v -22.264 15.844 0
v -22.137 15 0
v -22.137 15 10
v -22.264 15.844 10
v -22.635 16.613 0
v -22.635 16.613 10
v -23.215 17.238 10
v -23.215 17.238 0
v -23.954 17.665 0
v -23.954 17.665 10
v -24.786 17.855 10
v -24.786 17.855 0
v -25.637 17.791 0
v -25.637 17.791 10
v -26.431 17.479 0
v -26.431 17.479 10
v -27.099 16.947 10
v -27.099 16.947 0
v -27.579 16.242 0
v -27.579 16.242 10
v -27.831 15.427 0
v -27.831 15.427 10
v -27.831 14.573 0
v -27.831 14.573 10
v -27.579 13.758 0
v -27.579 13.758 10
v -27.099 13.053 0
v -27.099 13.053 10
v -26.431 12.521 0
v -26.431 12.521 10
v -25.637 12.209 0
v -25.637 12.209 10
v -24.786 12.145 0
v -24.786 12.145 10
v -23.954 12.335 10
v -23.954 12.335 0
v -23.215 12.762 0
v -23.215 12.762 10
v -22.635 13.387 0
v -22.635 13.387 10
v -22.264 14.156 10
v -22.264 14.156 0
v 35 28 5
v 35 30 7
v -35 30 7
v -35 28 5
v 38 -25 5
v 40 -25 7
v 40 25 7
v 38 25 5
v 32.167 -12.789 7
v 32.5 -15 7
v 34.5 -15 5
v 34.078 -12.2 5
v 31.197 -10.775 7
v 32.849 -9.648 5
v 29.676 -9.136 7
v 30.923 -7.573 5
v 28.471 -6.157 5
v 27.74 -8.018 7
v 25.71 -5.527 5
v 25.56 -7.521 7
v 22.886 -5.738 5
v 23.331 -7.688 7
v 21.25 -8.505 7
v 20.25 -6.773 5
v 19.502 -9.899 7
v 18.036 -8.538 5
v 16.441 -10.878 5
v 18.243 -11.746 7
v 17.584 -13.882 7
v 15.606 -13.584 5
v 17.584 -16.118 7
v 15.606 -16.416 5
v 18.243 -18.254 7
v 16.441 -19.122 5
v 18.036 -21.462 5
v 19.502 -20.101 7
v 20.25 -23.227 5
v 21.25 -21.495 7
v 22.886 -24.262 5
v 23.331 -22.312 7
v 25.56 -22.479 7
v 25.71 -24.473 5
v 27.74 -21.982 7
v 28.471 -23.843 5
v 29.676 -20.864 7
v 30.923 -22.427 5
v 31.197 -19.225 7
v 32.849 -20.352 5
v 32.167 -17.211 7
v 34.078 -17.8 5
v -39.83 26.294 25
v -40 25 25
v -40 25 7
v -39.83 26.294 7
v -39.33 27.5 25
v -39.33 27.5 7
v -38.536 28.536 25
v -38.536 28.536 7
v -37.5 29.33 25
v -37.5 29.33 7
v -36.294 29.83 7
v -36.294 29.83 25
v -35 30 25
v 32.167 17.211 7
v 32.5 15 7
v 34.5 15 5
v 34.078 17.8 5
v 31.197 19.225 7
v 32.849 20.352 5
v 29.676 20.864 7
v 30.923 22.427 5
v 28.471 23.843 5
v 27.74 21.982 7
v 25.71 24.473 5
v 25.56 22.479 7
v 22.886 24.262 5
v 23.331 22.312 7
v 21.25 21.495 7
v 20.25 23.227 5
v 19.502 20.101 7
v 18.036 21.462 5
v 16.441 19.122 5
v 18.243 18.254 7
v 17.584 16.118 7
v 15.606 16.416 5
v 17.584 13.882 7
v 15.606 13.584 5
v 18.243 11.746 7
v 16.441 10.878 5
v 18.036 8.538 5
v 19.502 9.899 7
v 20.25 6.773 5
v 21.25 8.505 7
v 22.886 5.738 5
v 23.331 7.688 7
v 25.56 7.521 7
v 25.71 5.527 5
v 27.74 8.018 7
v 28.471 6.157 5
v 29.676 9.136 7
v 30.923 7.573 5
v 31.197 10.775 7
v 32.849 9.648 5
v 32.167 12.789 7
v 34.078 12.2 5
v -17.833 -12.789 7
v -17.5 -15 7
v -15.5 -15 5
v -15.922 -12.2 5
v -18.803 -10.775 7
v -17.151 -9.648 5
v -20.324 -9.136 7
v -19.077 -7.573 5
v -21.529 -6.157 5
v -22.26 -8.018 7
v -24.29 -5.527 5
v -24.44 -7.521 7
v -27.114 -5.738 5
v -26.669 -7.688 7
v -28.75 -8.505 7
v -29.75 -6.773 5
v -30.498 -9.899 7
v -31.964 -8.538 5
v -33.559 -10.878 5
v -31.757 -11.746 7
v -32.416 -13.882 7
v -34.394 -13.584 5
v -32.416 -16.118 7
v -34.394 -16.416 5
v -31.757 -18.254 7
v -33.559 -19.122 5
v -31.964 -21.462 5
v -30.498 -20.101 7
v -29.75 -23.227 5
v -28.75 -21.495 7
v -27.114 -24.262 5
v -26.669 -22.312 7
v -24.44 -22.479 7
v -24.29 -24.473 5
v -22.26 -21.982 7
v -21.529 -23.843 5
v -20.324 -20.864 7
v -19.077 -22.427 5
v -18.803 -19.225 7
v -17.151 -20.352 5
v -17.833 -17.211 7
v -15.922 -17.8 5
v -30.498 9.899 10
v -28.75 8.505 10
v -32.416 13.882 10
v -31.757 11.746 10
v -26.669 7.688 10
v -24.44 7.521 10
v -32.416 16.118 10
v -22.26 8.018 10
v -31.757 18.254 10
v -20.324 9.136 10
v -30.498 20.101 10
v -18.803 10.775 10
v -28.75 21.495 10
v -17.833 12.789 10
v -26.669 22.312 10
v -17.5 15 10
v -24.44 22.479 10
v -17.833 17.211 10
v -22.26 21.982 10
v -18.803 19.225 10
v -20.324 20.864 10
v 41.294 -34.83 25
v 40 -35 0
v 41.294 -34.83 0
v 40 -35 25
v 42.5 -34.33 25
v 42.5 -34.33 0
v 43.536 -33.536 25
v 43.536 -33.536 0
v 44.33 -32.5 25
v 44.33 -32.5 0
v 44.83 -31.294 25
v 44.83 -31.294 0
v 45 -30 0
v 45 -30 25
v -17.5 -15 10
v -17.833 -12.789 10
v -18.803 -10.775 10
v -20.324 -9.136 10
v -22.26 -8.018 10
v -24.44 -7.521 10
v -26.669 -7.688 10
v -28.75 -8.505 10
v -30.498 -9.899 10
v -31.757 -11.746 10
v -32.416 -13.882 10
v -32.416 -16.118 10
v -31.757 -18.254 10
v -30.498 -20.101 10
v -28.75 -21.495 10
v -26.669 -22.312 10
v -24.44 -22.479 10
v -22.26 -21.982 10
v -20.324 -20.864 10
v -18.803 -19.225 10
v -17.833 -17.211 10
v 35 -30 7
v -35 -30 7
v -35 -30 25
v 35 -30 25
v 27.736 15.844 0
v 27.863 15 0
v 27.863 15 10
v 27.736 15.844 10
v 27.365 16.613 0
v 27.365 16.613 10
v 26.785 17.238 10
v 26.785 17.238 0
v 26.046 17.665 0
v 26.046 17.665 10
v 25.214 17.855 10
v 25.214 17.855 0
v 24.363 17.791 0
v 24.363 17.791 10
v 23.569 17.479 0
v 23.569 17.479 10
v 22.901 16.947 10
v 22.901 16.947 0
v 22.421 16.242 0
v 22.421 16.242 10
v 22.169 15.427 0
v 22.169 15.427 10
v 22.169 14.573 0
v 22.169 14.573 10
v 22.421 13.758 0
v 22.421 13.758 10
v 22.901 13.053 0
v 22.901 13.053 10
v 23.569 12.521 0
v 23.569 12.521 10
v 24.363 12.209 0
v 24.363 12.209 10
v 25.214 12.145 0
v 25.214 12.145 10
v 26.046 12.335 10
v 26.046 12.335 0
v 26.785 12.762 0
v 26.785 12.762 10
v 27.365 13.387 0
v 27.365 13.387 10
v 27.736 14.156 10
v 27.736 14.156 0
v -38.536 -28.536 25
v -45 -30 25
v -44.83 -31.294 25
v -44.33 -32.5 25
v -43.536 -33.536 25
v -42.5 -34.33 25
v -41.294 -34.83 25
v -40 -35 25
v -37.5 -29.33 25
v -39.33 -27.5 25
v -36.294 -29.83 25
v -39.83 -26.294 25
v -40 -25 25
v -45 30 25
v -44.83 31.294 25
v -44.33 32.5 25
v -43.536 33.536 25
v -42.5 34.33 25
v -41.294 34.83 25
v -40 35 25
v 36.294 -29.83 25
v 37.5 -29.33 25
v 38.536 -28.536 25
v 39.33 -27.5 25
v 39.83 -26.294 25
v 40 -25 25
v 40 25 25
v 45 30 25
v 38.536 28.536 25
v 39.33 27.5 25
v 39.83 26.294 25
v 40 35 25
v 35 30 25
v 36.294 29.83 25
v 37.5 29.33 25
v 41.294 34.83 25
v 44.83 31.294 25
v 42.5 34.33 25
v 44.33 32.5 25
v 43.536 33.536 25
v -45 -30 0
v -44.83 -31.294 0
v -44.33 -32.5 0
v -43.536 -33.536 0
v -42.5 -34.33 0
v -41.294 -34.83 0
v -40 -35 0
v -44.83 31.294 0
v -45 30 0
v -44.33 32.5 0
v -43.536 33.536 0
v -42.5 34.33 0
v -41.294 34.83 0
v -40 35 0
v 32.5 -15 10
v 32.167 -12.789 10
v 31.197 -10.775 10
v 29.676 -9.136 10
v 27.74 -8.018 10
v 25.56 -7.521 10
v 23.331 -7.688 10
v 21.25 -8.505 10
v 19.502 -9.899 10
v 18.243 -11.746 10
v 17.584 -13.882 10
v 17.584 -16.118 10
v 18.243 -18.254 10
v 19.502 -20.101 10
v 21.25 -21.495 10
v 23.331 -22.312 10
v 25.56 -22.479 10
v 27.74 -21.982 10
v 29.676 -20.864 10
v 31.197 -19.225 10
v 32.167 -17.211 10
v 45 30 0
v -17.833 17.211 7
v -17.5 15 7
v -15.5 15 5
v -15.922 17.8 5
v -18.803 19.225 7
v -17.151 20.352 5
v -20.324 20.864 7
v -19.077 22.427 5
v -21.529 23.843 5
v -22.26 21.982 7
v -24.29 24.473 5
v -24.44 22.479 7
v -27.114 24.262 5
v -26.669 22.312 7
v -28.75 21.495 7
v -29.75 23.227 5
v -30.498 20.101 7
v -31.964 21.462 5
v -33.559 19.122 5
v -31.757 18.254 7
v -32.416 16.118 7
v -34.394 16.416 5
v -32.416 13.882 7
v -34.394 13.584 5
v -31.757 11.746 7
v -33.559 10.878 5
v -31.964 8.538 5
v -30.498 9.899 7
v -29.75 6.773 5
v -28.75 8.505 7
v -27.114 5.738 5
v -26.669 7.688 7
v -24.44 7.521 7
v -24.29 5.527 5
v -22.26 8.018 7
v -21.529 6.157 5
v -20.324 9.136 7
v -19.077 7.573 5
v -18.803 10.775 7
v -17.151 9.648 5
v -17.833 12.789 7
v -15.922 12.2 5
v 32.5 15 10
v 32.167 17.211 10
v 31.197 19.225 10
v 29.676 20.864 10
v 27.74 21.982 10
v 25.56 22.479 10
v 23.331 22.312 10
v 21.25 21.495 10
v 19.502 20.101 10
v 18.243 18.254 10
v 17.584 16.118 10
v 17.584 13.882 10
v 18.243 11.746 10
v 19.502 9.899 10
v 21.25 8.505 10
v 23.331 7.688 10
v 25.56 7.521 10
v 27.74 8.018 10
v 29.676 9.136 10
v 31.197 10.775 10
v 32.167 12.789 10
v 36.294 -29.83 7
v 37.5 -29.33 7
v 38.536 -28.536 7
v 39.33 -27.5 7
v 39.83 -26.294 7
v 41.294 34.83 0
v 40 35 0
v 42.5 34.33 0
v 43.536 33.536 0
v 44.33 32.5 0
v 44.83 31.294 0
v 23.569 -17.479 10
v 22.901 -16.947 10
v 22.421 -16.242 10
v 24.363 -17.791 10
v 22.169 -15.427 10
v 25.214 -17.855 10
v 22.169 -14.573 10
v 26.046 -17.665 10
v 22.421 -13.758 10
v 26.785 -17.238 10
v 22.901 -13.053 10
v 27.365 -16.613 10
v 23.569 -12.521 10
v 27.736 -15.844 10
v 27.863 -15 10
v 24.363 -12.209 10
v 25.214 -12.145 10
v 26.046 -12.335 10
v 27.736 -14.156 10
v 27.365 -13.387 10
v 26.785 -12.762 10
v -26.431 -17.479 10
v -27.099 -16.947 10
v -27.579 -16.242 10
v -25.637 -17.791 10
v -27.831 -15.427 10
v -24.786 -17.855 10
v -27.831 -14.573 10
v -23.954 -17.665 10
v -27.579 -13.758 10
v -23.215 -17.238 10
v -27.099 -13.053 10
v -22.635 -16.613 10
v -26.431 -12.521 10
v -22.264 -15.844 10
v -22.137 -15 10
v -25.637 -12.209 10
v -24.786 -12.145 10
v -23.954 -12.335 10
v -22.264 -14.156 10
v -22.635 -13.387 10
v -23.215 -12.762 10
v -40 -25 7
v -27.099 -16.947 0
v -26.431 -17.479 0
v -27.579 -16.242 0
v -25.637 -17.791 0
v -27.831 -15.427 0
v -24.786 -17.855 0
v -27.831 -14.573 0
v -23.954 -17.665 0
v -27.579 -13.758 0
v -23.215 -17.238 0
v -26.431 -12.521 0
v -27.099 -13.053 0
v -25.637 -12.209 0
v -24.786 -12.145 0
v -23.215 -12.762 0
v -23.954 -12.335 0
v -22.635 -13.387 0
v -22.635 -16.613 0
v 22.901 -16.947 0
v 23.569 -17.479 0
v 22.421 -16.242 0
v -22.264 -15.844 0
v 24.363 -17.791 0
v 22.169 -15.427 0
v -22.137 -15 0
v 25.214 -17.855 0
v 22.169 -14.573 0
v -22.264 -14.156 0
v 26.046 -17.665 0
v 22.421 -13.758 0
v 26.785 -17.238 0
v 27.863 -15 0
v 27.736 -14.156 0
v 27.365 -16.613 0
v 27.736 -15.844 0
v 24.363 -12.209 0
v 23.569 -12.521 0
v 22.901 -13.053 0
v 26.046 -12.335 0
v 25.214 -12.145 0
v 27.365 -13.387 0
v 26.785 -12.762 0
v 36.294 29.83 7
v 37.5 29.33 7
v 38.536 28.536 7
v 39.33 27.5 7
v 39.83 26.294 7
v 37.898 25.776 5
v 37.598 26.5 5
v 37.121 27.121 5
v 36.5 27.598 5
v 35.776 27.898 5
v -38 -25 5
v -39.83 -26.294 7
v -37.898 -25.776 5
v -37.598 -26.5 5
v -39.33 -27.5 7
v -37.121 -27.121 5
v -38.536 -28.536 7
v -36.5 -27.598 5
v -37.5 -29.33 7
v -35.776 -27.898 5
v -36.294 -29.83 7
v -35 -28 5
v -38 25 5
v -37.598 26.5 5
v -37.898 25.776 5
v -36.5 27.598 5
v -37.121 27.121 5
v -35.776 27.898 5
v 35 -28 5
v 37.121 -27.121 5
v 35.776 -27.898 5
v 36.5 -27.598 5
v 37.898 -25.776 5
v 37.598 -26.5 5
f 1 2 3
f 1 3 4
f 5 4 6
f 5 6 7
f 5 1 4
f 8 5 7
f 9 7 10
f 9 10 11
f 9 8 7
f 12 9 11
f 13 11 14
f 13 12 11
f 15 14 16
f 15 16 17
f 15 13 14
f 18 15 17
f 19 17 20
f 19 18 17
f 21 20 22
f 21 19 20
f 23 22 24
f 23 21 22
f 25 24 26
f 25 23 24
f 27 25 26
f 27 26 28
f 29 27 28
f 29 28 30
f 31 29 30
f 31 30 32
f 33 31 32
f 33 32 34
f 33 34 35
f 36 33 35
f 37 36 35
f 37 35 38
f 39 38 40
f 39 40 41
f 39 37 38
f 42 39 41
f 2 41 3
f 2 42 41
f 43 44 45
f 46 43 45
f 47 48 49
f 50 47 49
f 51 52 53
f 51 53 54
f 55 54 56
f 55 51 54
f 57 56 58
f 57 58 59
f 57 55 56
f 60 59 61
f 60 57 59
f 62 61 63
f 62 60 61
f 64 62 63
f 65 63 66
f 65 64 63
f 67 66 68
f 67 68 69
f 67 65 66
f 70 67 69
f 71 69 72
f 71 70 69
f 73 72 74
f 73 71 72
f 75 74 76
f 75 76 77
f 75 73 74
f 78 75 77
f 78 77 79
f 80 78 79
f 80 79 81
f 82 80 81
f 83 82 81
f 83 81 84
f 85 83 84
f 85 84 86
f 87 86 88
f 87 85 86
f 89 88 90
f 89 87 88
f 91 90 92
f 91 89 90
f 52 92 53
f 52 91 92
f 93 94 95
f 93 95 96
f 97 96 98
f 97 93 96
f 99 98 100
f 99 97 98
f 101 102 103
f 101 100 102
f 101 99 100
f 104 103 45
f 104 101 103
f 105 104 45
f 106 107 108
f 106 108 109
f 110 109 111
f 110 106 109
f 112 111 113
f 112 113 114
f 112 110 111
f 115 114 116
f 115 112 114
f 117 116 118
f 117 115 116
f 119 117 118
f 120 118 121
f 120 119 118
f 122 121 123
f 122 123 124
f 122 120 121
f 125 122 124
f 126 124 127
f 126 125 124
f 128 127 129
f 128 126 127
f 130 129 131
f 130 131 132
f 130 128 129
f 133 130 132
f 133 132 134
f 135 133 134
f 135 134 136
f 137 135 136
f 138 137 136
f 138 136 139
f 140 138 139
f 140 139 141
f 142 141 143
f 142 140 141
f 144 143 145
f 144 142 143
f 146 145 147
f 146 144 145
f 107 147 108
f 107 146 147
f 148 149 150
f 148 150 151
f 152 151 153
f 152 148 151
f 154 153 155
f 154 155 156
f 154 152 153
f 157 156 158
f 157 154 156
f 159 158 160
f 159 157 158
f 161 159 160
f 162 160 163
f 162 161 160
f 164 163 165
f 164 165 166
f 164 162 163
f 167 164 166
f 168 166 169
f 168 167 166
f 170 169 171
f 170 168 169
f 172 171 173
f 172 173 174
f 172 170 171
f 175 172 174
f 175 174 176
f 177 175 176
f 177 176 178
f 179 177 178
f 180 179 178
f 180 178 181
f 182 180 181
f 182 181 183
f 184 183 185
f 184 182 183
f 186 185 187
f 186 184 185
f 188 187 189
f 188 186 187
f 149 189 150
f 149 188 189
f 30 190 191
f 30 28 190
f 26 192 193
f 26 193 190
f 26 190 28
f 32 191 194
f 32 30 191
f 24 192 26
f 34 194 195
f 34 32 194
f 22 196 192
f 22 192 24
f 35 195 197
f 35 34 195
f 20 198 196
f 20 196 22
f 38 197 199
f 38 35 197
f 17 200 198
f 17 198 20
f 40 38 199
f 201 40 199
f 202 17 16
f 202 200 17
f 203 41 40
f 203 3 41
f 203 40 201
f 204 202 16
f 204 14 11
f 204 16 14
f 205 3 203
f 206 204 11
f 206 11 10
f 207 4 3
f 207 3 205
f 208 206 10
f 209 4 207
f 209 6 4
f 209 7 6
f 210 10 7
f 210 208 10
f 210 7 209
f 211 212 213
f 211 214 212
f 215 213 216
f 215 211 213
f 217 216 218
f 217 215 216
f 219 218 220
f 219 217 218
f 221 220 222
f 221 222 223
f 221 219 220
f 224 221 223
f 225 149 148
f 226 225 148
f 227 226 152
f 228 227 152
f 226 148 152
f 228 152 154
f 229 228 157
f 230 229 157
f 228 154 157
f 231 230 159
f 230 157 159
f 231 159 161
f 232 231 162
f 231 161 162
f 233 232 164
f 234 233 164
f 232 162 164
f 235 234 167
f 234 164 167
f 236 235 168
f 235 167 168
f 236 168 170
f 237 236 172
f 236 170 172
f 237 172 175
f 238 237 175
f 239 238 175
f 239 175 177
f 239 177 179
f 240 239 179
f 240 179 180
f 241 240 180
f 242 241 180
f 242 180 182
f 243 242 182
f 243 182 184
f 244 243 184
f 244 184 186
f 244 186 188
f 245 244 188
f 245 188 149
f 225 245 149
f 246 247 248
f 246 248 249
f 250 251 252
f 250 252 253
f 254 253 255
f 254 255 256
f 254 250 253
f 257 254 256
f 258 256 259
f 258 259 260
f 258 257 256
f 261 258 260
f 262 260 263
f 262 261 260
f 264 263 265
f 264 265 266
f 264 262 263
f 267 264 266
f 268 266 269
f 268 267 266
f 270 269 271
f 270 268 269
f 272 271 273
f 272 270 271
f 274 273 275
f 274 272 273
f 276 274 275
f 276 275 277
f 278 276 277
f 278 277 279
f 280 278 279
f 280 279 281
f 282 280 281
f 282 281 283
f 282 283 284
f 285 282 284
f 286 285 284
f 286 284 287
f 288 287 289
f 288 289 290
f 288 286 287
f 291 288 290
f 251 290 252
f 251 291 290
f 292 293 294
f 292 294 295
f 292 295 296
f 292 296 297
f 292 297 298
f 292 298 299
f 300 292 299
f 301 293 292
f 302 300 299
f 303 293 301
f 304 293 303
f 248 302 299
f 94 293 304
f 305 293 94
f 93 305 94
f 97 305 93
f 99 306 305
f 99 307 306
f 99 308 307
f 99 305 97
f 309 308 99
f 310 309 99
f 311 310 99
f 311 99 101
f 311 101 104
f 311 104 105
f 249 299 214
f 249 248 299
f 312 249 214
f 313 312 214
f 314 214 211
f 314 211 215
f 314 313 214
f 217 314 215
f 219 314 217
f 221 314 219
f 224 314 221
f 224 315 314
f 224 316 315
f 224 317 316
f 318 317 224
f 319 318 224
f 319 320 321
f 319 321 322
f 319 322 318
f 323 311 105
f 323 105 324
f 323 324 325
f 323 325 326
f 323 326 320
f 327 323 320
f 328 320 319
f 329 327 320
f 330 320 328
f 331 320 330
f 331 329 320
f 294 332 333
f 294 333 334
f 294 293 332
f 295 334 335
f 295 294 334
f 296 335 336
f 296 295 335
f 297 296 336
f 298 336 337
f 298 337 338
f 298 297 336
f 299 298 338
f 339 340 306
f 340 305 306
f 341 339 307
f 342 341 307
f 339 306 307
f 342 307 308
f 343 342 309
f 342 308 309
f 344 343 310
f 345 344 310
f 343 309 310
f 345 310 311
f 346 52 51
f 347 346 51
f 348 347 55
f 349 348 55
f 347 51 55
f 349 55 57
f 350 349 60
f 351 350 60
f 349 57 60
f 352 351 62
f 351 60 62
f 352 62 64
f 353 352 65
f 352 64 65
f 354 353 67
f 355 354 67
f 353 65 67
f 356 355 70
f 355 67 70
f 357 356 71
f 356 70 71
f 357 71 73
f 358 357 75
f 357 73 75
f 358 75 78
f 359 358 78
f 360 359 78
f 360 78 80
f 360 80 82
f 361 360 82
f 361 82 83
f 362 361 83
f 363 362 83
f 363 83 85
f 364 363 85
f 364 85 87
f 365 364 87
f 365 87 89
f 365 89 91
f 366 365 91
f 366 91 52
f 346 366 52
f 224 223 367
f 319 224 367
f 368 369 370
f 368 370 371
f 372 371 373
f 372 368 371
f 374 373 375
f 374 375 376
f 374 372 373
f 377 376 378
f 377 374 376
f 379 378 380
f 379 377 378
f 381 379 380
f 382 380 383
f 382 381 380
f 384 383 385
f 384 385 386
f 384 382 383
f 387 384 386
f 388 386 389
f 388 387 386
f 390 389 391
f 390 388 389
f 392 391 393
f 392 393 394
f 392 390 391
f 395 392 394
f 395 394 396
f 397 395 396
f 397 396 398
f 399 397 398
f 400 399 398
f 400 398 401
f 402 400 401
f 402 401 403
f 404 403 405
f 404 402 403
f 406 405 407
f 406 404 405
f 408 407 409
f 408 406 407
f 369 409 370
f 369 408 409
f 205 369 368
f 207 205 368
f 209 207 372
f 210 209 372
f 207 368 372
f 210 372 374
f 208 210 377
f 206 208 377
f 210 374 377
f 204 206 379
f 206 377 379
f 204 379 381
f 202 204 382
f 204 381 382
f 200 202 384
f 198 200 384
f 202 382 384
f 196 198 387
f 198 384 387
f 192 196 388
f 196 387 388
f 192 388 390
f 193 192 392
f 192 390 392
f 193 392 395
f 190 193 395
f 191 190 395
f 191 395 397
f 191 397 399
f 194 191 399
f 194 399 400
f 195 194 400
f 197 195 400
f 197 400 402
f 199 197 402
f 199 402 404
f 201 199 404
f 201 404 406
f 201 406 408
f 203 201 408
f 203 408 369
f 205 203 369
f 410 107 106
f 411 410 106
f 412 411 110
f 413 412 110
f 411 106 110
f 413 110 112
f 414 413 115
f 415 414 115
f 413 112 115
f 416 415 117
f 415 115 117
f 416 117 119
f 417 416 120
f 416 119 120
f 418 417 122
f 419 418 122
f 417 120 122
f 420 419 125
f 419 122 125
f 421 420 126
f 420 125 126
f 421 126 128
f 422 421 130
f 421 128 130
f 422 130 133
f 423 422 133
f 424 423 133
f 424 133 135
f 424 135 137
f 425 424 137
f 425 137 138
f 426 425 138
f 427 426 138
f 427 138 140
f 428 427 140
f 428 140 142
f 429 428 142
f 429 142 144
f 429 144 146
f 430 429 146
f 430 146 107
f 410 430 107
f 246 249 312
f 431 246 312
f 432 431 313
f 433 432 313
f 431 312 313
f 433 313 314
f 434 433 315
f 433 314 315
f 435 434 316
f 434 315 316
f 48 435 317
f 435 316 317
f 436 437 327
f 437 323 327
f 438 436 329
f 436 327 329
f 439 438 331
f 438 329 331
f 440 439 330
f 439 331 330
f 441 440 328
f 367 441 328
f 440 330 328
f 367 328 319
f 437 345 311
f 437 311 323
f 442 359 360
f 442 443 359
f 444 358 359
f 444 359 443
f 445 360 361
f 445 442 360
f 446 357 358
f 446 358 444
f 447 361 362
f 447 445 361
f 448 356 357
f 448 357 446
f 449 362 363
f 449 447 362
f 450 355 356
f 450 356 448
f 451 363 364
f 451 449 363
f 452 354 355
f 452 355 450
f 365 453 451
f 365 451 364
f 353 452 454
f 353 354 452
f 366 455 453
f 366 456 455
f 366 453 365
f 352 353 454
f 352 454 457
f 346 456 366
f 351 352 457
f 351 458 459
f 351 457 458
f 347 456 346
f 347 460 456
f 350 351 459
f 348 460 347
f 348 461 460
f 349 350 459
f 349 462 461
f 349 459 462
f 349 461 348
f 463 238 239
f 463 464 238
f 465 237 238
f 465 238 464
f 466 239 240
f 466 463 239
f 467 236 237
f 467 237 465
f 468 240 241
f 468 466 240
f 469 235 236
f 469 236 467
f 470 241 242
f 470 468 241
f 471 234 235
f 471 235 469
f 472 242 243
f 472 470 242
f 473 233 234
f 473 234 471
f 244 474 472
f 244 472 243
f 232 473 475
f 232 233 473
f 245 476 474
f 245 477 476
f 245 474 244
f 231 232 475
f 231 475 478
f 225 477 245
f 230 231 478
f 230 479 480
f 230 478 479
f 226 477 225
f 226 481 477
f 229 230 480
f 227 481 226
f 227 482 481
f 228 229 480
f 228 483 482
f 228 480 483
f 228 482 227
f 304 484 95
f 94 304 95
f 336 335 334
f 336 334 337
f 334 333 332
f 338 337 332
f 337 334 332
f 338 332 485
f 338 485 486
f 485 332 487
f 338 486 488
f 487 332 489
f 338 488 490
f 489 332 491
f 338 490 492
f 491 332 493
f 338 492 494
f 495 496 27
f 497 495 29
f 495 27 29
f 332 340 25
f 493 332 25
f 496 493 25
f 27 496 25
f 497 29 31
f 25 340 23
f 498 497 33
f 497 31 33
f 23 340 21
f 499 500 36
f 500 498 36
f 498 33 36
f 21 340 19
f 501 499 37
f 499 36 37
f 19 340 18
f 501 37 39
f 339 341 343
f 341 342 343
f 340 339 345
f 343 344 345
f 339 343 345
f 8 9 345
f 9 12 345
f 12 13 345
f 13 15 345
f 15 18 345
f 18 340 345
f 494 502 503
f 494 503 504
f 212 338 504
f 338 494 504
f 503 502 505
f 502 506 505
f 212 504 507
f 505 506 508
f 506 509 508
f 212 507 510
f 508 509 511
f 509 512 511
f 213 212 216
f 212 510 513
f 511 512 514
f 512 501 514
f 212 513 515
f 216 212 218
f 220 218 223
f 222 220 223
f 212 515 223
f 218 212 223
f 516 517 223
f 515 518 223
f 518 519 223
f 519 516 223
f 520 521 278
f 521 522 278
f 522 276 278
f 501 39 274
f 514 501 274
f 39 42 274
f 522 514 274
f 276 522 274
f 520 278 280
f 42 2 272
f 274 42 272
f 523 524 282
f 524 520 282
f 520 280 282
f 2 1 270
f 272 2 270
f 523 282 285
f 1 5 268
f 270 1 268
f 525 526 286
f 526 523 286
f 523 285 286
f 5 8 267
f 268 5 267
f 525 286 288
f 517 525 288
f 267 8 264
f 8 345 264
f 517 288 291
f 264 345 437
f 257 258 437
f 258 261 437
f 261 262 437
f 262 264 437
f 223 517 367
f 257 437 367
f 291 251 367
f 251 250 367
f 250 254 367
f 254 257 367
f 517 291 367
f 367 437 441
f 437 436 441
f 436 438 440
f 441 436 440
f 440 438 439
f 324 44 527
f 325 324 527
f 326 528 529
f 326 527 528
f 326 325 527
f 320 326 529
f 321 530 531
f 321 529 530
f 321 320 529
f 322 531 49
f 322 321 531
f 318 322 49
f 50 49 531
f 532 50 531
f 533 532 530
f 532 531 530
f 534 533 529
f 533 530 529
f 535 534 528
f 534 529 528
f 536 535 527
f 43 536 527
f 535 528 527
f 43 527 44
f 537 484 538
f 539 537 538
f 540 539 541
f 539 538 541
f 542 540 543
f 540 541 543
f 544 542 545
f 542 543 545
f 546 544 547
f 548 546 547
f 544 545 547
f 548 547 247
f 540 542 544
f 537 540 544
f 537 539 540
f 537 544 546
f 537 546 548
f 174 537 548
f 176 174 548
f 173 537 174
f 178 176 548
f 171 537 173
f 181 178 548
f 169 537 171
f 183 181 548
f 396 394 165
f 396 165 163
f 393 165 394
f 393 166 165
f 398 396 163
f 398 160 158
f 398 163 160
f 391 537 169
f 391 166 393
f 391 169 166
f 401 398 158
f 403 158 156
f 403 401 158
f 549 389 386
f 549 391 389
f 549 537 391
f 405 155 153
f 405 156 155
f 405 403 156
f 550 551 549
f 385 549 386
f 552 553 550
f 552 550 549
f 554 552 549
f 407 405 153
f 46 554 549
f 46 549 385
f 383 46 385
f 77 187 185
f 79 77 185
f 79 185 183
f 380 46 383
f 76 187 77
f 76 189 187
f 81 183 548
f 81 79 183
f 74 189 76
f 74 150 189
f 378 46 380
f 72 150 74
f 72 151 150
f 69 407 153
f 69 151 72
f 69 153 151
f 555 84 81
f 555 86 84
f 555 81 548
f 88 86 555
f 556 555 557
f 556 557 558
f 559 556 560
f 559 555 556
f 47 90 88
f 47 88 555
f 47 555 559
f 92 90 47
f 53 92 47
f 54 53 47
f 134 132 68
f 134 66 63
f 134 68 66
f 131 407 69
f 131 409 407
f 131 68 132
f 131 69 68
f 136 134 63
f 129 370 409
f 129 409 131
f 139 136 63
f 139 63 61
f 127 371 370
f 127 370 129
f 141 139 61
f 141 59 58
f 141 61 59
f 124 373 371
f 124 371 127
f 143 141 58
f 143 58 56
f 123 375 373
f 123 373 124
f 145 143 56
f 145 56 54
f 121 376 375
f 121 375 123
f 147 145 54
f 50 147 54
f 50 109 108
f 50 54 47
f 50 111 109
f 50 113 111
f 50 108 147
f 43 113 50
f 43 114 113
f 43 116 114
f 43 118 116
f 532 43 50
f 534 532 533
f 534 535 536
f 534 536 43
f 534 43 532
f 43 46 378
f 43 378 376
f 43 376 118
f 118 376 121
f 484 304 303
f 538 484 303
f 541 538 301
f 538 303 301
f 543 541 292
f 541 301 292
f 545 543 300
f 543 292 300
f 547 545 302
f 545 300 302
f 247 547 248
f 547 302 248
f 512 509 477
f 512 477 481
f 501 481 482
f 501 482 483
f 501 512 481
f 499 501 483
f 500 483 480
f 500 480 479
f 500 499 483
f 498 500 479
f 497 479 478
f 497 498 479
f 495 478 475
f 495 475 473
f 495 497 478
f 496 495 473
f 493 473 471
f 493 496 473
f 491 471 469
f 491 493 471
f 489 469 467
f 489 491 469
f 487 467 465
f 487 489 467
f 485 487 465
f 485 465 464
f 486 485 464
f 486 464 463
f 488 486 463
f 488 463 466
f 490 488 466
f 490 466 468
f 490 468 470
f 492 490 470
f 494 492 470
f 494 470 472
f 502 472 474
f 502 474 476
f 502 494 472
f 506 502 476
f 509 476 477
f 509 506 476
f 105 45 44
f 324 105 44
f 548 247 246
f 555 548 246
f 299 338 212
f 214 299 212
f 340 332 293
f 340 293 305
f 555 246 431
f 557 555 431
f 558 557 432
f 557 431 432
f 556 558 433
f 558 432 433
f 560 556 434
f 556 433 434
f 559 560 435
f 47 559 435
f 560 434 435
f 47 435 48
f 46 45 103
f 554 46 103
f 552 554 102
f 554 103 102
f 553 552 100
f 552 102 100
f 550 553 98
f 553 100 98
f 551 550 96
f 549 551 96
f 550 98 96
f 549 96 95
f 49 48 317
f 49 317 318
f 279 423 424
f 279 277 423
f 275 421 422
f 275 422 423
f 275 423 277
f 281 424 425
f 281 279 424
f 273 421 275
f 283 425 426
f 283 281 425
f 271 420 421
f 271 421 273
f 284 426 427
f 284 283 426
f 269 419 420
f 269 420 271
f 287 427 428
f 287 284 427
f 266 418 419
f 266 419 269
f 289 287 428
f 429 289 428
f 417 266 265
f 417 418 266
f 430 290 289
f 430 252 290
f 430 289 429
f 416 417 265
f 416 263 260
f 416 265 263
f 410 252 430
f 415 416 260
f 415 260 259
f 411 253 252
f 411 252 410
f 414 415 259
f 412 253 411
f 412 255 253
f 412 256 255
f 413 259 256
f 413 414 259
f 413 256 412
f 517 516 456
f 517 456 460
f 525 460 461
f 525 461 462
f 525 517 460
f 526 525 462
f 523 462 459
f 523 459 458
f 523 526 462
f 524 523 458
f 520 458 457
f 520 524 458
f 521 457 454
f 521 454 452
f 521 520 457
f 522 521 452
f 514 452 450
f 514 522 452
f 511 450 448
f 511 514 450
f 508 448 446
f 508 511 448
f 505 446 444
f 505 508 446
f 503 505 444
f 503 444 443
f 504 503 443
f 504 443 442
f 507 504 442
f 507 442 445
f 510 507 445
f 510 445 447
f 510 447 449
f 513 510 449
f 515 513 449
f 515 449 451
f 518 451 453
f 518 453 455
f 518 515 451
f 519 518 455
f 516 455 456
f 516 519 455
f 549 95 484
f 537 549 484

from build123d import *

# Parameters (mm, degrees)
F0_W     = 90
F0_H     = 70
F0_W_2   = 80
F0_H_2   = 60
F1_DEPTH = 25
F0_R     = 7.5
F2_DEPTH = 5
F0_R_2   = 2.8629120086
F3_DEPTH = 10
F4_R     = 5
F5_SIZE  = 2


with BuildPart() as f1:
    # F0 (on Top) → F1 (new body)
    with BuildSketch(Plane.XY):
        Rectangle(F0_W, F0_H)
        Rectangle(F0_W_2, F0_H_2, mode=Mode.SUBTRACT)
    extrude(amount=F1_DEPTH)

    # F0 (on Top) → F2 (join)
    with BuildSketch(Plane.XY):
        Rectangle(F0_W_2, F0_H_2)
        with Locations((-25, -15)):
            Circle(F0_R, mode=Mode.SUBTRACT)
        with Locations((25, -15)):
            Circle(F0_R, mode=Mode.SUBTRACT)
        with Locations((-25, 15)):
            Circle(F0_R, mode=Mode.SUBTRACT)
        with Locations((25, 15)):
            Circle(F0_R, mode=Mode.SUBTRACT)
    extrude(amount=F2_DEPTH)

    # F0 (on Top) → F3 (join)
    with BuildSketch(Plane.XY):
        with Locations((-25, 15)):
            Circle(F0_R)
        with Locations((-25, 15)):
            Circle(F0_R_2, mode=Mode.SUBTRACT)
        with Locations((-25, -15)):
            Circle(F0_R)
        with Locations((-25, -15)):
            Circle(F0_R_2, mode=Mode.SUBTRACT)
        with Locations((25, 15)):
            Circle(F0_R)
        with Locations((25, 15)):
            Circle(F0_R_2, mode=Mode.SUBTRACT)
        with Locations((25, -15)):
            Circle(F0_R)
        with Locations((25, -15)):
            Circle(F0_R_2, mode=Mode.SUBTRACT)
    extrude(amount=F3_DEPTH)

    # F4
    f4_edges = [f1.edges().sort_by_distance(p)[0] for p in [
        (-40, 30, 15),
        (45, 35, 12.5),
        (45, -35, 12.5),
        (-45, -35, 12.5),
        (-45, 35, 12.5),
        (40, -30, 15),
        (-40, -30, 15),
        (40, 30, 15),
    ]]
    fillet(f4_edges, radius=F4_R)

    # F5
    f5_edges = [f1.edges().sort_by_distance(p)[0] for p in [
        (-32.5, 15, 5),
        (17.5, 15, 5),
        (-32.5, -15, 5),
        (0, -30, 5),
        (-38.535534, -28.535534, 5),
        (38.535534, -28.535534, 5),
        (-40, 0, 5),
        (40, 0, 5),
        (-38.535534, 28.535534, 5),
        (38.535534, 28.535534, 5),
        (0, 30, 5),
        (17.5, -15, 5),
    ]]
    chamfer(f5_edges, length=F5_SIZE)


solid = f1.part
